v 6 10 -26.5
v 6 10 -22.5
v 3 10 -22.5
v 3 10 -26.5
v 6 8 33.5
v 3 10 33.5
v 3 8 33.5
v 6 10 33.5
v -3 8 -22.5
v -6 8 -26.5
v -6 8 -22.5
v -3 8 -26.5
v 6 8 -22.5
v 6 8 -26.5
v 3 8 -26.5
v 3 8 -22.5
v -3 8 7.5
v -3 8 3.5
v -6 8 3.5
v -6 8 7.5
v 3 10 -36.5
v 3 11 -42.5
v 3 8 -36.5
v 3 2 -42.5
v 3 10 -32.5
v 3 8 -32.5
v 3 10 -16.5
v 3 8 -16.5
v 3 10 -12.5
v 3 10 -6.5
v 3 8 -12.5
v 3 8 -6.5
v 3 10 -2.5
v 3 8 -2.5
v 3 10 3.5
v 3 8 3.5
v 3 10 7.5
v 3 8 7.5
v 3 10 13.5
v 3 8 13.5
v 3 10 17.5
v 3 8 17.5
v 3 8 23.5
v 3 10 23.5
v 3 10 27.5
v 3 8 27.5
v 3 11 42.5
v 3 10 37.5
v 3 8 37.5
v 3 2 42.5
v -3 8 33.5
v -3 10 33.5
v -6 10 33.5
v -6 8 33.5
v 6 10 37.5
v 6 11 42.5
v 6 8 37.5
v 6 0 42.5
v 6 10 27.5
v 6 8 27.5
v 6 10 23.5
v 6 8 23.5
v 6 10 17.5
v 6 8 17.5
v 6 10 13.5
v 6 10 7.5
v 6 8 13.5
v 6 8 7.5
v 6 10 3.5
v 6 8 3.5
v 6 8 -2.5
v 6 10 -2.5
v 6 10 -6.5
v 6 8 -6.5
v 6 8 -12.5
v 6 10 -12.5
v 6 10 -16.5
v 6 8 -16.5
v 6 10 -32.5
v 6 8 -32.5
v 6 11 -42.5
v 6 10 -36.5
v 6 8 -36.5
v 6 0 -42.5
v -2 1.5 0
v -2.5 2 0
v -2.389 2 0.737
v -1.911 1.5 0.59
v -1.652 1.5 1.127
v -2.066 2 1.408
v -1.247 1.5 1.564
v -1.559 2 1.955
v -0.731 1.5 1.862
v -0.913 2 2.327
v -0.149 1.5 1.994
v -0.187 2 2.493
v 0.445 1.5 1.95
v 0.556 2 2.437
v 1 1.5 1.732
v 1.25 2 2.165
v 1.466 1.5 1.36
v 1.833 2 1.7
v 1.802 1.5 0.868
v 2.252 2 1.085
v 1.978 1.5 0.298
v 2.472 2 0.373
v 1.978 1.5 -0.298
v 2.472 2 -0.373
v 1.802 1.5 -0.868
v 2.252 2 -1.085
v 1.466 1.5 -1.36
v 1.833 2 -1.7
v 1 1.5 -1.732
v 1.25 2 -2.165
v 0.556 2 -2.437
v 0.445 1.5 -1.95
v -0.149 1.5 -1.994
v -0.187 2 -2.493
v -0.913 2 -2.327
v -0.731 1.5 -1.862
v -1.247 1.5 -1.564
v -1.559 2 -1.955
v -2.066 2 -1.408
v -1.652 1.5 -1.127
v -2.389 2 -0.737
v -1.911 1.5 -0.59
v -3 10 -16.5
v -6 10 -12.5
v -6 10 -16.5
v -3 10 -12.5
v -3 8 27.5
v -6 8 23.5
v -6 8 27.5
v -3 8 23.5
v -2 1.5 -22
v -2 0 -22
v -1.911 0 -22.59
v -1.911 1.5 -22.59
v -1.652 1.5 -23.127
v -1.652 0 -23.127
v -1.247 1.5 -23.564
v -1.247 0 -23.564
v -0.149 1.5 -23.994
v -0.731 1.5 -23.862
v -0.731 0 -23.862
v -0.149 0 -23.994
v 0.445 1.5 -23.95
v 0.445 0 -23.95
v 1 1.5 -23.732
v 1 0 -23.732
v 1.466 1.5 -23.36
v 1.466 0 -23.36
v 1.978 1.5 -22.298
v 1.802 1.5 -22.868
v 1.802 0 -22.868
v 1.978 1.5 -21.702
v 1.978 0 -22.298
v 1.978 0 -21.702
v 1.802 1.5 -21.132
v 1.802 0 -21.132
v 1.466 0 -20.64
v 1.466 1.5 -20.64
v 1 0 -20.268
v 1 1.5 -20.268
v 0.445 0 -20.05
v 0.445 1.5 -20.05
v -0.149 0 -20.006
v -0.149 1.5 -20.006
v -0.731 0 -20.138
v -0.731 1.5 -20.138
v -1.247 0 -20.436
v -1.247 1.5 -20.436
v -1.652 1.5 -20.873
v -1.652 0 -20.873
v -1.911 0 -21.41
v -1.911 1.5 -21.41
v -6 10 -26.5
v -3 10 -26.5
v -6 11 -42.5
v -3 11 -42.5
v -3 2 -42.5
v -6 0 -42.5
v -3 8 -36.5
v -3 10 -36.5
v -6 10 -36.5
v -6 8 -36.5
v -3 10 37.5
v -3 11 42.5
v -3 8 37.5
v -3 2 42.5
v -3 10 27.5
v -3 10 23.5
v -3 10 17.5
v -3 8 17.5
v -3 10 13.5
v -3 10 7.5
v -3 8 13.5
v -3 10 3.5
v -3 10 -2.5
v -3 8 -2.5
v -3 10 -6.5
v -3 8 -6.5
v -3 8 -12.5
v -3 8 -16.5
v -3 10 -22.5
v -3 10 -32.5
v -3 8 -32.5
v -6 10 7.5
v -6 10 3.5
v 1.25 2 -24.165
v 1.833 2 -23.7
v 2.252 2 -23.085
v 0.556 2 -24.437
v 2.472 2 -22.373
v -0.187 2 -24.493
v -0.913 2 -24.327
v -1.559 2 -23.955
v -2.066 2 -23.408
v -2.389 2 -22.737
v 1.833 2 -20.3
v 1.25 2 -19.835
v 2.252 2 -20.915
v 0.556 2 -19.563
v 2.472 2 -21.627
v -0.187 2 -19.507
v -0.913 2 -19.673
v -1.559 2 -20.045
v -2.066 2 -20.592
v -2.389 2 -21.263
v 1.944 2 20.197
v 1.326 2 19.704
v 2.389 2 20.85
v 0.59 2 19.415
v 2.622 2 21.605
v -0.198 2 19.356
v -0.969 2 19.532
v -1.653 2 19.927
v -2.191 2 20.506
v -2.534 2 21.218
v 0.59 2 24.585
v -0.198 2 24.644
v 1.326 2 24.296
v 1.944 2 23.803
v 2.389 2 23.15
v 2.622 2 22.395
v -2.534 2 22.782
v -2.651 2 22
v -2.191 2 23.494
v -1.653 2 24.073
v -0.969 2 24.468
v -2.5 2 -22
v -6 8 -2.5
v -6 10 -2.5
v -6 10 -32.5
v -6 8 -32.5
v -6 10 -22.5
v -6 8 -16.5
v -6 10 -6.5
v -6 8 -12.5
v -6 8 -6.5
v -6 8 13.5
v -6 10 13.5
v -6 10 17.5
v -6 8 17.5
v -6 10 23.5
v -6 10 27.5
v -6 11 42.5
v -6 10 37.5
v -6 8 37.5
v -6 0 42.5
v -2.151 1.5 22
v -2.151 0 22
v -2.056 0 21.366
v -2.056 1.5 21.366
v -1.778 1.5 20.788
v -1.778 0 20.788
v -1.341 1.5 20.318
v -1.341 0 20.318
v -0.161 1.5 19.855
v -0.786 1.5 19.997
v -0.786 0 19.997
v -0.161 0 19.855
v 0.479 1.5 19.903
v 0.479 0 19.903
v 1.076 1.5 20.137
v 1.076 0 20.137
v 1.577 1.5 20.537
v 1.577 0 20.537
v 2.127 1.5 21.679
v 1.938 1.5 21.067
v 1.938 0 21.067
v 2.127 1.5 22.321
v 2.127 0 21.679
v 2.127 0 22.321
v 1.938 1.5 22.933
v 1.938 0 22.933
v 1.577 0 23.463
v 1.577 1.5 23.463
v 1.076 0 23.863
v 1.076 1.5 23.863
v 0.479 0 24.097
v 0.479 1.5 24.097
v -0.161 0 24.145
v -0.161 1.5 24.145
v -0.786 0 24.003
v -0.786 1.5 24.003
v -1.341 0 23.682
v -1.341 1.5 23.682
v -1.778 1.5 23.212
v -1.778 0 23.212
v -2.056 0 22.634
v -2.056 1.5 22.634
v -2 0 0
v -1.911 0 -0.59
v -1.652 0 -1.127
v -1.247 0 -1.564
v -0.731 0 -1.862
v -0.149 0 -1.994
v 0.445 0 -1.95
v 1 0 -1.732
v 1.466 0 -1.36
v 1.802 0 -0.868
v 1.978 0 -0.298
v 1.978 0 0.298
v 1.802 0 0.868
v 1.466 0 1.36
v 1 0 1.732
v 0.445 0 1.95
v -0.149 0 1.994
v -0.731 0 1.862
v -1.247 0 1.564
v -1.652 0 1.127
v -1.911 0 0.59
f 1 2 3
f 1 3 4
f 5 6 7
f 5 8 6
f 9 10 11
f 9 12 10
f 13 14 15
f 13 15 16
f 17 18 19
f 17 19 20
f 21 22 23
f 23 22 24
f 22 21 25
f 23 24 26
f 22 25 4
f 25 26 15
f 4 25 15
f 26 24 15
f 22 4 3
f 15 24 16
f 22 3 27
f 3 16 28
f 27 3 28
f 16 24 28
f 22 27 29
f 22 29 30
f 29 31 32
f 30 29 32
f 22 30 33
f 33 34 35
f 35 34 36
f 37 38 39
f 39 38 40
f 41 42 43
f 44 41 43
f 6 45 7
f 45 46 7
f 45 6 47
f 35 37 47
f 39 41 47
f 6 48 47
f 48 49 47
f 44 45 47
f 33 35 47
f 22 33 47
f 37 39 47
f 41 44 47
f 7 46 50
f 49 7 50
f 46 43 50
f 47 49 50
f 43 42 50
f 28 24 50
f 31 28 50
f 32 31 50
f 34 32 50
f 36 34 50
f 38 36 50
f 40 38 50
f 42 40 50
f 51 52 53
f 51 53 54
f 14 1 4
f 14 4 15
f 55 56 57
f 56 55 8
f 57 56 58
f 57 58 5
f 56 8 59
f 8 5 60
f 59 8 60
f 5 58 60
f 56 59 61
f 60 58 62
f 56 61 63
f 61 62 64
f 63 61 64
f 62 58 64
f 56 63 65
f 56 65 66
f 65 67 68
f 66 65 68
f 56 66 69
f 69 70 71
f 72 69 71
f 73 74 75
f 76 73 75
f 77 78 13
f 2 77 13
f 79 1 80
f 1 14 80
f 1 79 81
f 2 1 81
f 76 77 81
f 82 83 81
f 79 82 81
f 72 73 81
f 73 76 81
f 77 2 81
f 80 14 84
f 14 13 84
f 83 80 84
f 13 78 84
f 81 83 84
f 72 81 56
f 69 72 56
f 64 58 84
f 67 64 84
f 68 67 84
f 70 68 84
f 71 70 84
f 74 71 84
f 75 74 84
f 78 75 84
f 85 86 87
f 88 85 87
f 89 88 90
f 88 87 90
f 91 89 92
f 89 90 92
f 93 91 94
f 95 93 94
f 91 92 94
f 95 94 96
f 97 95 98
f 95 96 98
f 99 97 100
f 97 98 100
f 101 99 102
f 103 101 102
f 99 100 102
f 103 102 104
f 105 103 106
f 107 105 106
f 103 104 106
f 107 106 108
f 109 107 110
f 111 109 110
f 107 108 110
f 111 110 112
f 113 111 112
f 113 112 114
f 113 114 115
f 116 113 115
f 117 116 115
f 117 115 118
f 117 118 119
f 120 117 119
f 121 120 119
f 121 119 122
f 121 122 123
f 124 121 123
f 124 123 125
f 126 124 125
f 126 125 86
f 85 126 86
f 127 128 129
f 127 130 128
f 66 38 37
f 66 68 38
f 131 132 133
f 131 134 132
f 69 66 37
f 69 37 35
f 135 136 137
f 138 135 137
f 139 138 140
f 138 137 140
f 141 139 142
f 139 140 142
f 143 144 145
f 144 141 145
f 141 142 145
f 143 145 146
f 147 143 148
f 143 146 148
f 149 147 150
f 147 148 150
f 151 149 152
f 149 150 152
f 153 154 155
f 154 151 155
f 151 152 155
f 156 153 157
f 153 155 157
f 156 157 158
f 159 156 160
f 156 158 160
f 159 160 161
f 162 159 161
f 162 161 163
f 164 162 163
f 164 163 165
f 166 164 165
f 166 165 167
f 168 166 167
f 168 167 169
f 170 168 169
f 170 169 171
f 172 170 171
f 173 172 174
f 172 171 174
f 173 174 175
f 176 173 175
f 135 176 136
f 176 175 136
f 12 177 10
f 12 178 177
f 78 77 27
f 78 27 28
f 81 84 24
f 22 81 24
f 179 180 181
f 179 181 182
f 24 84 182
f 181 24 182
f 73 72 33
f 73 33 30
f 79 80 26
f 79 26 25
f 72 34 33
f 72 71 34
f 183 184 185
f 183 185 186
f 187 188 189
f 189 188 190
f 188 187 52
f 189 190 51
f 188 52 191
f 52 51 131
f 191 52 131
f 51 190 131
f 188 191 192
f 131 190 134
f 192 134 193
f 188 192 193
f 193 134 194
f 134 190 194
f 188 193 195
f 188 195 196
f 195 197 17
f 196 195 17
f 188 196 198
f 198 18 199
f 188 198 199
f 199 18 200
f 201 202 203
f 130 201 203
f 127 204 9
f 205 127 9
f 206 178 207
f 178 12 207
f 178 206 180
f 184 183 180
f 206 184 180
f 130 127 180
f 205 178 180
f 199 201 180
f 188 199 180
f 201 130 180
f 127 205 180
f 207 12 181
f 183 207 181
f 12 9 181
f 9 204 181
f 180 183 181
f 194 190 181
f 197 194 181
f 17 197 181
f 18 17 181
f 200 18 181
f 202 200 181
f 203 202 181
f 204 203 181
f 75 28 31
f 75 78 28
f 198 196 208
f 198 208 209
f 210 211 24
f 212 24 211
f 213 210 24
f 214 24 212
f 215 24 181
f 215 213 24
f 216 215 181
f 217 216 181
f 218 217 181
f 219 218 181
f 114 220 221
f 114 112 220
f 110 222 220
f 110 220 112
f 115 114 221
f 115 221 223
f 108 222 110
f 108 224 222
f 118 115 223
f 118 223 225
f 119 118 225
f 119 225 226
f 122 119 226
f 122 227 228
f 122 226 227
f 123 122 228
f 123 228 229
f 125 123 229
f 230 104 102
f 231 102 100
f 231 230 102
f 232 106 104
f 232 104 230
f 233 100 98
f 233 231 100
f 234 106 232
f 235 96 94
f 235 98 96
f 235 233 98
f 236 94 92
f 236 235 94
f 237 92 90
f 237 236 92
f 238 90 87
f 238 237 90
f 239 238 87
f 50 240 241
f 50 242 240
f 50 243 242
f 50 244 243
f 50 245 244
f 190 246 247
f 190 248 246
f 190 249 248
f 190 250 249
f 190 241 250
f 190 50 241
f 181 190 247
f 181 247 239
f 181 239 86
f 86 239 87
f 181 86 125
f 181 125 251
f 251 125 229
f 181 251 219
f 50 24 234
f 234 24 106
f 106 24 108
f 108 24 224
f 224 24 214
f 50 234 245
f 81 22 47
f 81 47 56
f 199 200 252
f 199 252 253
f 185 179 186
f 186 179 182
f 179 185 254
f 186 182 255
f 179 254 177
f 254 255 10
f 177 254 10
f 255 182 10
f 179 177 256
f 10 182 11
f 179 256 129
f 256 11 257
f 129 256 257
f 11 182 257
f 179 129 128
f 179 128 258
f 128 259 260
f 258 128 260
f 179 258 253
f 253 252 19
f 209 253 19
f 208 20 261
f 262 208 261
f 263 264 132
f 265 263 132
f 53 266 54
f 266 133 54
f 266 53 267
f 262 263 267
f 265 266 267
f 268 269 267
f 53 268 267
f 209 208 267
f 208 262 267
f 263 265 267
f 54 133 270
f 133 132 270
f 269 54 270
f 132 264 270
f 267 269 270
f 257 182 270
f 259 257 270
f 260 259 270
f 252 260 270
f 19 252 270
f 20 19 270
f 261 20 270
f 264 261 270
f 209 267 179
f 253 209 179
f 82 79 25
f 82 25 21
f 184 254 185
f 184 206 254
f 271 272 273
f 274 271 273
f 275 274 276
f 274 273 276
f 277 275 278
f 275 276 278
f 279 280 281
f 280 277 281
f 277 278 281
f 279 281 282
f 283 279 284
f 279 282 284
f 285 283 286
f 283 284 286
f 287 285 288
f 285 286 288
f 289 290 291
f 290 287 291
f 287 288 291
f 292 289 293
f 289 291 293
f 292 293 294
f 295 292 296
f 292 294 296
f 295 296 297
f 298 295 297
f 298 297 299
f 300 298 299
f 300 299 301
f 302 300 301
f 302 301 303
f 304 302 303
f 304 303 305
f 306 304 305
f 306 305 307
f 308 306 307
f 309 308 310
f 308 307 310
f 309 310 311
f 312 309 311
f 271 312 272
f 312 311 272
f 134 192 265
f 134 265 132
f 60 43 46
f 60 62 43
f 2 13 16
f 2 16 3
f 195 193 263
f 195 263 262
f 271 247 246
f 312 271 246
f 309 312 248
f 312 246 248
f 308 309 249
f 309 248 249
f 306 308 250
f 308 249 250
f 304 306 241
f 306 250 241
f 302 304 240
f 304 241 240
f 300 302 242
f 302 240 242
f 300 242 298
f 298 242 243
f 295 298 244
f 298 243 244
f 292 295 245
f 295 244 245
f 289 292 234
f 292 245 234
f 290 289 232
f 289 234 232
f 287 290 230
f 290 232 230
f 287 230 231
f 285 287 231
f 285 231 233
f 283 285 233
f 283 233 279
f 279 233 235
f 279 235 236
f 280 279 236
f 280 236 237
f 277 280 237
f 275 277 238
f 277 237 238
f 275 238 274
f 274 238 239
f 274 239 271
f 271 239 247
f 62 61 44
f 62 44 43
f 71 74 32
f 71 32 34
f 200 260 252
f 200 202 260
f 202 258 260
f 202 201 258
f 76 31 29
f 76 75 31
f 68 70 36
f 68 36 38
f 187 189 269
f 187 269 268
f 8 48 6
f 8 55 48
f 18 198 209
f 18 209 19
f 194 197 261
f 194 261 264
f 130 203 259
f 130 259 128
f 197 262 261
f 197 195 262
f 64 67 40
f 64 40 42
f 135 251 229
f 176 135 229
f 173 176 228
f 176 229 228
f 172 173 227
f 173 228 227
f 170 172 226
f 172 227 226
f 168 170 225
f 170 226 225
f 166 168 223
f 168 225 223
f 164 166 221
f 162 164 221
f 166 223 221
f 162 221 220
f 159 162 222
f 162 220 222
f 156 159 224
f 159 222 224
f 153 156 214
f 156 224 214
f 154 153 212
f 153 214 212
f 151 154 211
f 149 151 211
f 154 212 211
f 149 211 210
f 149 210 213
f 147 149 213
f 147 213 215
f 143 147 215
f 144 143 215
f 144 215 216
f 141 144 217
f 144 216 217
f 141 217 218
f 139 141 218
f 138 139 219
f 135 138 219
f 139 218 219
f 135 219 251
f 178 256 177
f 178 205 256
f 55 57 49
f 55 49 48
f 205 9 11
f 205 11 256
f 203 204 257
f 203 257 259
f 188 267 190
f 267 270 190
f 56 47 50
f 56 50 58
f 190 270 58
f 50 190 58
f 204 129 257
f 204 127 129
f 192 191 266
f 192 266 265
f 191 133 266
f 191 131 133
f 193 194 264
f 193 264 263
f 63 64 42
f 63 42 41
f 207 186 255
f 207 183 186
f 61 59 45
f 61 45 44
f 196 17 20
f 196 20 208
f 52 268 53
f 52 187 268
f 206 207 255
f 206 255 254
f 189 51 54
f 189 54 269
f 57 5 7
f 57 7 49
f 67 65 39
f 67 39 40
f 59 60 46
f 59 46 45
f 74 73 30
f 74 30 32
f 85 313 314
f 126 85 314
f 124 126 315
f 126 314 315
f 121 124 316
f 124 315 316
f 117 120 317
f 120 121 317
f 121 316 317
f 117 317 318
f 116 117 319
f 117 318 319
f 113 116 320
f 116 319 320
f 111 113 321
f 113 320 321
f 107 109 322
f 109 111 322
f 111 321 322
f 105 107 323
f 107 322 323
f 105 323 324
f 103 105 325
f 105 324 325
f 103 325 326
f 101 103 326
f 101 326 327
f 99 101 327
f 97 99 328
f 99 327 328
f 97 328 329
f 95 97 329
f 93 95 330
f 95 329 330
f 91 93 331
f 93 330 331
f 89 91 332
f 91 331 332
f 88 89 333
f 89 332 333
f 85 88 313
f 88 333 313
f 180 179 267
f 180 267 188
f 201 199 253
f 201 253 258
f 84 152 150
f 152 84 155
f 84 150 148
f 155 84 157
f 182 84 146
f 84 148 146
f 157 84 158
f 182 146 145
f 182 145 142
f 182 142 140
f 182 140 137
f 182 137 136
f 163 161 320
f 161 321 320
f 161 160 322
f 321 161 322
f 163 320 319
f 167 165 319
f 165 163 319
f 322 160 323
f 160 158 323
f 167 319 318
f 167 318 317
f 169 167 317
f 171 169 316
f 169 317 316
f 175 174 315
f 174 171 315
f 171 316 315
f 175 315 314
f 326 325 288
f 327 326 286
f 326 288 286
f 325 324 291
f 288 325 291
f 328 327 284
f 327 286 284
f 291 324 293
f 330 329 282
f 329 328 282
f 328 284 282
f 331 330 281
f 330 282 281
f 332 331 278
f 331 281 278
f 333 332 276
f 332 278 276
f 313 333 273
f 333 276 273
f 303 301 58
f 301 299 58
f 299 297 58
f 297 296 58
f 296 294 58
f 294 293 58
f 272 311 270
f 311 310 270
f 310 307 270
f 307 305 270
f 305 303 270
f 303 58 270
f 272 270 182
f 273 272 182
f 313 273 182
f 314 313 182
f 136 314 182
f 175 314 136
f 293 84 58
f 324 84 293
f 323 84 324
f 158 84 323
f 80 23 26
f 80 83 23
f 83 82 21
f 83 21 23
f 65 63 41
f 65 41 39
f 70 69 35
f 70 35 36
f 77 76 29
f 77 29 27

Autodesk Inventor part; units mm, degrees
ref_plane "YZ Plane" through (0, 0, 0) normal (1, 0, 0) x (0, 1, 0)
ref_plane "XZ Plane" through (0, 0, 0) normal (0, 1, 0) x (-1, 0, 0)
ref_plane "XY Plane" through (0, 0, 0) normal (0, 0, 1) x (1, 0, 0)
sketch "Эскиз1" plane through (0, 0, 0) normal (0, 1, 0) x (-1, 0, 0)
  line L0 (-6, -42.5) -> (6, -42.5)
  line L1 (6, -42.5) -> (6, 42.5)
  line L2 (6, 42.5) -> (-6, 42.5)
  line L3 (-6, 42.5) -> (-6, -42.5)
  line L4 (-6, -42.5) -> (6, 42.5) construction
  line L5 (6, -42.5) -> (-6, 42.5) construction
  circle A0 centre (0, 0) radius 2
  circle A1 centre (0, 22) radius 2.1514
  circle A2 centre (0, -22) radius 2
  dimension "d0" = 4
  dimension "d1" = 22
  dimension "d2" = 22
  dimension "d3" = 85
  dimension "d4" = 12
extrude "Выдавливание1" add sketch "Эскиз1" along normal blind 2
sketch "Эскиз2" plane through (0, 2, 0) normal (0, 1, 0) x (1, 0, 0)
  line L0 (-6, 42.5) -> (-6, -42.5) projected
  line L1 (-6, -42.5) -> (6, -42.5) projected
  line L2 (6, -42.5) -> (6, 42.5) projected
  line L3 (6, 42.5) -> (-6, 42.5) projected
  circle A0 centre (0, 0) radius 2 projected
  circle A1 centre (0, -22) radius 2.1514 projected
  circle A2 centre (0, 22) radius 2 projected
  line L4 (-6, -42.5) -> (-3, -42.5)
  line L5 (-3, -42.5) -> (-3, 42.5)
  line L6 (-3, 42.5) -> (-6, 42.5)
  line L7 (-6, 42.5) -> (-6, -42.5)
  line L8 (6, 42.5) -> (3, 42.5)
  line L9 (3, 42.5) -> (3, -42.5)
  line L10 (3, -42.5) -> (6, -42.5)
  line L11 (6, -42.5) -> (6, 42.5)
  dimension "d7" = 3
  dimension "d8" = 3
extrude "Выдавливание2" add sketch "Эскиз2" along normal blind 9 contours L3 L5 L1 L0 | L3 L2 L1 L9
chamfer "Фаска1" distance 0.5 angle 45 1 edges at (2.1514, 2, 22)
chamfer "Фаска2" distance 0.5 angle 45 2 edges at (2, 2, 0) (2, 2, -22)
sketch "Эскиз3" plane through (6, 0, 42.5) normal (1, 0, 0) x (0, 0, -1)
  line L0 (5, 10) -> (9, 10)
  line L1 (9, 10) -> (9, 8)
  line L2 (9, 8) -> (5, 8)
  line L3 (5, 8) -> (5, 10)
  line L4 (0, 11) -> (85, 11) projected
  line L5 (0, 0) -> (0, 11) projected
  line L6 (15, 10) -> (19, 10)
  line L7 (19, 10) -> (19, 8)
  line L8 (19, 8) -> (15, 8)
  line L9 (15, 8) -> (15, 10)
  line L10 (25, 10) -> (29, 10)
  line L11 (29, 10) -> (29, 8)
  line L12 (29, 8) -> (25, 8)
  line L13 (25, 8) -> (25, 10)
  line L14 (35, 10) -> (39, 10)
  line L15 (39, 10) -> (39, 8)
  line L16 (39, 8) -> (35, 8)
  line L17 (35, 8) -> (35, 10)
  line L18 (45, 10) -> (49, 10)
  line L19 (49, 10) -> (49, 8)
  line L20 (49, 8) -> (45, 8)
  line L21 (45, 8) -> (45, 10)
  line L22 (55, 10) -> (59, 10)
  line L23 (59, 10) -> (59, 8)
  line L24 (59, 8) -> (55, 8)
  line L25 (55, 8) -> (55, 10)
  line L26 (65, 10) -> (69, 10)
  line L27 (69, 10) -> (69, 8)
  line L28 (69, 8) -> (65, 8)
  line L29 (65, 8) -> (65, 10)
  line L30 (75, 10) -> (79, 10)
  line L31 (79, 10) -> (79, 8)
  line L32 (79, 8) -> (75, 8)
  line L33 (75, 8) -> (75, 10)
  point P0 (42.5, 0)
  dimension "d17" = 4
  dimension "d18" = 2
  dimension "d19" = 1
  dimension "d20" = 5
  dimension "d23" = 10
extrude "Выдавливание3" cut sketch "Эскиз3" against normal up to surface (12 mm away)
properties part number "рейка кати"
